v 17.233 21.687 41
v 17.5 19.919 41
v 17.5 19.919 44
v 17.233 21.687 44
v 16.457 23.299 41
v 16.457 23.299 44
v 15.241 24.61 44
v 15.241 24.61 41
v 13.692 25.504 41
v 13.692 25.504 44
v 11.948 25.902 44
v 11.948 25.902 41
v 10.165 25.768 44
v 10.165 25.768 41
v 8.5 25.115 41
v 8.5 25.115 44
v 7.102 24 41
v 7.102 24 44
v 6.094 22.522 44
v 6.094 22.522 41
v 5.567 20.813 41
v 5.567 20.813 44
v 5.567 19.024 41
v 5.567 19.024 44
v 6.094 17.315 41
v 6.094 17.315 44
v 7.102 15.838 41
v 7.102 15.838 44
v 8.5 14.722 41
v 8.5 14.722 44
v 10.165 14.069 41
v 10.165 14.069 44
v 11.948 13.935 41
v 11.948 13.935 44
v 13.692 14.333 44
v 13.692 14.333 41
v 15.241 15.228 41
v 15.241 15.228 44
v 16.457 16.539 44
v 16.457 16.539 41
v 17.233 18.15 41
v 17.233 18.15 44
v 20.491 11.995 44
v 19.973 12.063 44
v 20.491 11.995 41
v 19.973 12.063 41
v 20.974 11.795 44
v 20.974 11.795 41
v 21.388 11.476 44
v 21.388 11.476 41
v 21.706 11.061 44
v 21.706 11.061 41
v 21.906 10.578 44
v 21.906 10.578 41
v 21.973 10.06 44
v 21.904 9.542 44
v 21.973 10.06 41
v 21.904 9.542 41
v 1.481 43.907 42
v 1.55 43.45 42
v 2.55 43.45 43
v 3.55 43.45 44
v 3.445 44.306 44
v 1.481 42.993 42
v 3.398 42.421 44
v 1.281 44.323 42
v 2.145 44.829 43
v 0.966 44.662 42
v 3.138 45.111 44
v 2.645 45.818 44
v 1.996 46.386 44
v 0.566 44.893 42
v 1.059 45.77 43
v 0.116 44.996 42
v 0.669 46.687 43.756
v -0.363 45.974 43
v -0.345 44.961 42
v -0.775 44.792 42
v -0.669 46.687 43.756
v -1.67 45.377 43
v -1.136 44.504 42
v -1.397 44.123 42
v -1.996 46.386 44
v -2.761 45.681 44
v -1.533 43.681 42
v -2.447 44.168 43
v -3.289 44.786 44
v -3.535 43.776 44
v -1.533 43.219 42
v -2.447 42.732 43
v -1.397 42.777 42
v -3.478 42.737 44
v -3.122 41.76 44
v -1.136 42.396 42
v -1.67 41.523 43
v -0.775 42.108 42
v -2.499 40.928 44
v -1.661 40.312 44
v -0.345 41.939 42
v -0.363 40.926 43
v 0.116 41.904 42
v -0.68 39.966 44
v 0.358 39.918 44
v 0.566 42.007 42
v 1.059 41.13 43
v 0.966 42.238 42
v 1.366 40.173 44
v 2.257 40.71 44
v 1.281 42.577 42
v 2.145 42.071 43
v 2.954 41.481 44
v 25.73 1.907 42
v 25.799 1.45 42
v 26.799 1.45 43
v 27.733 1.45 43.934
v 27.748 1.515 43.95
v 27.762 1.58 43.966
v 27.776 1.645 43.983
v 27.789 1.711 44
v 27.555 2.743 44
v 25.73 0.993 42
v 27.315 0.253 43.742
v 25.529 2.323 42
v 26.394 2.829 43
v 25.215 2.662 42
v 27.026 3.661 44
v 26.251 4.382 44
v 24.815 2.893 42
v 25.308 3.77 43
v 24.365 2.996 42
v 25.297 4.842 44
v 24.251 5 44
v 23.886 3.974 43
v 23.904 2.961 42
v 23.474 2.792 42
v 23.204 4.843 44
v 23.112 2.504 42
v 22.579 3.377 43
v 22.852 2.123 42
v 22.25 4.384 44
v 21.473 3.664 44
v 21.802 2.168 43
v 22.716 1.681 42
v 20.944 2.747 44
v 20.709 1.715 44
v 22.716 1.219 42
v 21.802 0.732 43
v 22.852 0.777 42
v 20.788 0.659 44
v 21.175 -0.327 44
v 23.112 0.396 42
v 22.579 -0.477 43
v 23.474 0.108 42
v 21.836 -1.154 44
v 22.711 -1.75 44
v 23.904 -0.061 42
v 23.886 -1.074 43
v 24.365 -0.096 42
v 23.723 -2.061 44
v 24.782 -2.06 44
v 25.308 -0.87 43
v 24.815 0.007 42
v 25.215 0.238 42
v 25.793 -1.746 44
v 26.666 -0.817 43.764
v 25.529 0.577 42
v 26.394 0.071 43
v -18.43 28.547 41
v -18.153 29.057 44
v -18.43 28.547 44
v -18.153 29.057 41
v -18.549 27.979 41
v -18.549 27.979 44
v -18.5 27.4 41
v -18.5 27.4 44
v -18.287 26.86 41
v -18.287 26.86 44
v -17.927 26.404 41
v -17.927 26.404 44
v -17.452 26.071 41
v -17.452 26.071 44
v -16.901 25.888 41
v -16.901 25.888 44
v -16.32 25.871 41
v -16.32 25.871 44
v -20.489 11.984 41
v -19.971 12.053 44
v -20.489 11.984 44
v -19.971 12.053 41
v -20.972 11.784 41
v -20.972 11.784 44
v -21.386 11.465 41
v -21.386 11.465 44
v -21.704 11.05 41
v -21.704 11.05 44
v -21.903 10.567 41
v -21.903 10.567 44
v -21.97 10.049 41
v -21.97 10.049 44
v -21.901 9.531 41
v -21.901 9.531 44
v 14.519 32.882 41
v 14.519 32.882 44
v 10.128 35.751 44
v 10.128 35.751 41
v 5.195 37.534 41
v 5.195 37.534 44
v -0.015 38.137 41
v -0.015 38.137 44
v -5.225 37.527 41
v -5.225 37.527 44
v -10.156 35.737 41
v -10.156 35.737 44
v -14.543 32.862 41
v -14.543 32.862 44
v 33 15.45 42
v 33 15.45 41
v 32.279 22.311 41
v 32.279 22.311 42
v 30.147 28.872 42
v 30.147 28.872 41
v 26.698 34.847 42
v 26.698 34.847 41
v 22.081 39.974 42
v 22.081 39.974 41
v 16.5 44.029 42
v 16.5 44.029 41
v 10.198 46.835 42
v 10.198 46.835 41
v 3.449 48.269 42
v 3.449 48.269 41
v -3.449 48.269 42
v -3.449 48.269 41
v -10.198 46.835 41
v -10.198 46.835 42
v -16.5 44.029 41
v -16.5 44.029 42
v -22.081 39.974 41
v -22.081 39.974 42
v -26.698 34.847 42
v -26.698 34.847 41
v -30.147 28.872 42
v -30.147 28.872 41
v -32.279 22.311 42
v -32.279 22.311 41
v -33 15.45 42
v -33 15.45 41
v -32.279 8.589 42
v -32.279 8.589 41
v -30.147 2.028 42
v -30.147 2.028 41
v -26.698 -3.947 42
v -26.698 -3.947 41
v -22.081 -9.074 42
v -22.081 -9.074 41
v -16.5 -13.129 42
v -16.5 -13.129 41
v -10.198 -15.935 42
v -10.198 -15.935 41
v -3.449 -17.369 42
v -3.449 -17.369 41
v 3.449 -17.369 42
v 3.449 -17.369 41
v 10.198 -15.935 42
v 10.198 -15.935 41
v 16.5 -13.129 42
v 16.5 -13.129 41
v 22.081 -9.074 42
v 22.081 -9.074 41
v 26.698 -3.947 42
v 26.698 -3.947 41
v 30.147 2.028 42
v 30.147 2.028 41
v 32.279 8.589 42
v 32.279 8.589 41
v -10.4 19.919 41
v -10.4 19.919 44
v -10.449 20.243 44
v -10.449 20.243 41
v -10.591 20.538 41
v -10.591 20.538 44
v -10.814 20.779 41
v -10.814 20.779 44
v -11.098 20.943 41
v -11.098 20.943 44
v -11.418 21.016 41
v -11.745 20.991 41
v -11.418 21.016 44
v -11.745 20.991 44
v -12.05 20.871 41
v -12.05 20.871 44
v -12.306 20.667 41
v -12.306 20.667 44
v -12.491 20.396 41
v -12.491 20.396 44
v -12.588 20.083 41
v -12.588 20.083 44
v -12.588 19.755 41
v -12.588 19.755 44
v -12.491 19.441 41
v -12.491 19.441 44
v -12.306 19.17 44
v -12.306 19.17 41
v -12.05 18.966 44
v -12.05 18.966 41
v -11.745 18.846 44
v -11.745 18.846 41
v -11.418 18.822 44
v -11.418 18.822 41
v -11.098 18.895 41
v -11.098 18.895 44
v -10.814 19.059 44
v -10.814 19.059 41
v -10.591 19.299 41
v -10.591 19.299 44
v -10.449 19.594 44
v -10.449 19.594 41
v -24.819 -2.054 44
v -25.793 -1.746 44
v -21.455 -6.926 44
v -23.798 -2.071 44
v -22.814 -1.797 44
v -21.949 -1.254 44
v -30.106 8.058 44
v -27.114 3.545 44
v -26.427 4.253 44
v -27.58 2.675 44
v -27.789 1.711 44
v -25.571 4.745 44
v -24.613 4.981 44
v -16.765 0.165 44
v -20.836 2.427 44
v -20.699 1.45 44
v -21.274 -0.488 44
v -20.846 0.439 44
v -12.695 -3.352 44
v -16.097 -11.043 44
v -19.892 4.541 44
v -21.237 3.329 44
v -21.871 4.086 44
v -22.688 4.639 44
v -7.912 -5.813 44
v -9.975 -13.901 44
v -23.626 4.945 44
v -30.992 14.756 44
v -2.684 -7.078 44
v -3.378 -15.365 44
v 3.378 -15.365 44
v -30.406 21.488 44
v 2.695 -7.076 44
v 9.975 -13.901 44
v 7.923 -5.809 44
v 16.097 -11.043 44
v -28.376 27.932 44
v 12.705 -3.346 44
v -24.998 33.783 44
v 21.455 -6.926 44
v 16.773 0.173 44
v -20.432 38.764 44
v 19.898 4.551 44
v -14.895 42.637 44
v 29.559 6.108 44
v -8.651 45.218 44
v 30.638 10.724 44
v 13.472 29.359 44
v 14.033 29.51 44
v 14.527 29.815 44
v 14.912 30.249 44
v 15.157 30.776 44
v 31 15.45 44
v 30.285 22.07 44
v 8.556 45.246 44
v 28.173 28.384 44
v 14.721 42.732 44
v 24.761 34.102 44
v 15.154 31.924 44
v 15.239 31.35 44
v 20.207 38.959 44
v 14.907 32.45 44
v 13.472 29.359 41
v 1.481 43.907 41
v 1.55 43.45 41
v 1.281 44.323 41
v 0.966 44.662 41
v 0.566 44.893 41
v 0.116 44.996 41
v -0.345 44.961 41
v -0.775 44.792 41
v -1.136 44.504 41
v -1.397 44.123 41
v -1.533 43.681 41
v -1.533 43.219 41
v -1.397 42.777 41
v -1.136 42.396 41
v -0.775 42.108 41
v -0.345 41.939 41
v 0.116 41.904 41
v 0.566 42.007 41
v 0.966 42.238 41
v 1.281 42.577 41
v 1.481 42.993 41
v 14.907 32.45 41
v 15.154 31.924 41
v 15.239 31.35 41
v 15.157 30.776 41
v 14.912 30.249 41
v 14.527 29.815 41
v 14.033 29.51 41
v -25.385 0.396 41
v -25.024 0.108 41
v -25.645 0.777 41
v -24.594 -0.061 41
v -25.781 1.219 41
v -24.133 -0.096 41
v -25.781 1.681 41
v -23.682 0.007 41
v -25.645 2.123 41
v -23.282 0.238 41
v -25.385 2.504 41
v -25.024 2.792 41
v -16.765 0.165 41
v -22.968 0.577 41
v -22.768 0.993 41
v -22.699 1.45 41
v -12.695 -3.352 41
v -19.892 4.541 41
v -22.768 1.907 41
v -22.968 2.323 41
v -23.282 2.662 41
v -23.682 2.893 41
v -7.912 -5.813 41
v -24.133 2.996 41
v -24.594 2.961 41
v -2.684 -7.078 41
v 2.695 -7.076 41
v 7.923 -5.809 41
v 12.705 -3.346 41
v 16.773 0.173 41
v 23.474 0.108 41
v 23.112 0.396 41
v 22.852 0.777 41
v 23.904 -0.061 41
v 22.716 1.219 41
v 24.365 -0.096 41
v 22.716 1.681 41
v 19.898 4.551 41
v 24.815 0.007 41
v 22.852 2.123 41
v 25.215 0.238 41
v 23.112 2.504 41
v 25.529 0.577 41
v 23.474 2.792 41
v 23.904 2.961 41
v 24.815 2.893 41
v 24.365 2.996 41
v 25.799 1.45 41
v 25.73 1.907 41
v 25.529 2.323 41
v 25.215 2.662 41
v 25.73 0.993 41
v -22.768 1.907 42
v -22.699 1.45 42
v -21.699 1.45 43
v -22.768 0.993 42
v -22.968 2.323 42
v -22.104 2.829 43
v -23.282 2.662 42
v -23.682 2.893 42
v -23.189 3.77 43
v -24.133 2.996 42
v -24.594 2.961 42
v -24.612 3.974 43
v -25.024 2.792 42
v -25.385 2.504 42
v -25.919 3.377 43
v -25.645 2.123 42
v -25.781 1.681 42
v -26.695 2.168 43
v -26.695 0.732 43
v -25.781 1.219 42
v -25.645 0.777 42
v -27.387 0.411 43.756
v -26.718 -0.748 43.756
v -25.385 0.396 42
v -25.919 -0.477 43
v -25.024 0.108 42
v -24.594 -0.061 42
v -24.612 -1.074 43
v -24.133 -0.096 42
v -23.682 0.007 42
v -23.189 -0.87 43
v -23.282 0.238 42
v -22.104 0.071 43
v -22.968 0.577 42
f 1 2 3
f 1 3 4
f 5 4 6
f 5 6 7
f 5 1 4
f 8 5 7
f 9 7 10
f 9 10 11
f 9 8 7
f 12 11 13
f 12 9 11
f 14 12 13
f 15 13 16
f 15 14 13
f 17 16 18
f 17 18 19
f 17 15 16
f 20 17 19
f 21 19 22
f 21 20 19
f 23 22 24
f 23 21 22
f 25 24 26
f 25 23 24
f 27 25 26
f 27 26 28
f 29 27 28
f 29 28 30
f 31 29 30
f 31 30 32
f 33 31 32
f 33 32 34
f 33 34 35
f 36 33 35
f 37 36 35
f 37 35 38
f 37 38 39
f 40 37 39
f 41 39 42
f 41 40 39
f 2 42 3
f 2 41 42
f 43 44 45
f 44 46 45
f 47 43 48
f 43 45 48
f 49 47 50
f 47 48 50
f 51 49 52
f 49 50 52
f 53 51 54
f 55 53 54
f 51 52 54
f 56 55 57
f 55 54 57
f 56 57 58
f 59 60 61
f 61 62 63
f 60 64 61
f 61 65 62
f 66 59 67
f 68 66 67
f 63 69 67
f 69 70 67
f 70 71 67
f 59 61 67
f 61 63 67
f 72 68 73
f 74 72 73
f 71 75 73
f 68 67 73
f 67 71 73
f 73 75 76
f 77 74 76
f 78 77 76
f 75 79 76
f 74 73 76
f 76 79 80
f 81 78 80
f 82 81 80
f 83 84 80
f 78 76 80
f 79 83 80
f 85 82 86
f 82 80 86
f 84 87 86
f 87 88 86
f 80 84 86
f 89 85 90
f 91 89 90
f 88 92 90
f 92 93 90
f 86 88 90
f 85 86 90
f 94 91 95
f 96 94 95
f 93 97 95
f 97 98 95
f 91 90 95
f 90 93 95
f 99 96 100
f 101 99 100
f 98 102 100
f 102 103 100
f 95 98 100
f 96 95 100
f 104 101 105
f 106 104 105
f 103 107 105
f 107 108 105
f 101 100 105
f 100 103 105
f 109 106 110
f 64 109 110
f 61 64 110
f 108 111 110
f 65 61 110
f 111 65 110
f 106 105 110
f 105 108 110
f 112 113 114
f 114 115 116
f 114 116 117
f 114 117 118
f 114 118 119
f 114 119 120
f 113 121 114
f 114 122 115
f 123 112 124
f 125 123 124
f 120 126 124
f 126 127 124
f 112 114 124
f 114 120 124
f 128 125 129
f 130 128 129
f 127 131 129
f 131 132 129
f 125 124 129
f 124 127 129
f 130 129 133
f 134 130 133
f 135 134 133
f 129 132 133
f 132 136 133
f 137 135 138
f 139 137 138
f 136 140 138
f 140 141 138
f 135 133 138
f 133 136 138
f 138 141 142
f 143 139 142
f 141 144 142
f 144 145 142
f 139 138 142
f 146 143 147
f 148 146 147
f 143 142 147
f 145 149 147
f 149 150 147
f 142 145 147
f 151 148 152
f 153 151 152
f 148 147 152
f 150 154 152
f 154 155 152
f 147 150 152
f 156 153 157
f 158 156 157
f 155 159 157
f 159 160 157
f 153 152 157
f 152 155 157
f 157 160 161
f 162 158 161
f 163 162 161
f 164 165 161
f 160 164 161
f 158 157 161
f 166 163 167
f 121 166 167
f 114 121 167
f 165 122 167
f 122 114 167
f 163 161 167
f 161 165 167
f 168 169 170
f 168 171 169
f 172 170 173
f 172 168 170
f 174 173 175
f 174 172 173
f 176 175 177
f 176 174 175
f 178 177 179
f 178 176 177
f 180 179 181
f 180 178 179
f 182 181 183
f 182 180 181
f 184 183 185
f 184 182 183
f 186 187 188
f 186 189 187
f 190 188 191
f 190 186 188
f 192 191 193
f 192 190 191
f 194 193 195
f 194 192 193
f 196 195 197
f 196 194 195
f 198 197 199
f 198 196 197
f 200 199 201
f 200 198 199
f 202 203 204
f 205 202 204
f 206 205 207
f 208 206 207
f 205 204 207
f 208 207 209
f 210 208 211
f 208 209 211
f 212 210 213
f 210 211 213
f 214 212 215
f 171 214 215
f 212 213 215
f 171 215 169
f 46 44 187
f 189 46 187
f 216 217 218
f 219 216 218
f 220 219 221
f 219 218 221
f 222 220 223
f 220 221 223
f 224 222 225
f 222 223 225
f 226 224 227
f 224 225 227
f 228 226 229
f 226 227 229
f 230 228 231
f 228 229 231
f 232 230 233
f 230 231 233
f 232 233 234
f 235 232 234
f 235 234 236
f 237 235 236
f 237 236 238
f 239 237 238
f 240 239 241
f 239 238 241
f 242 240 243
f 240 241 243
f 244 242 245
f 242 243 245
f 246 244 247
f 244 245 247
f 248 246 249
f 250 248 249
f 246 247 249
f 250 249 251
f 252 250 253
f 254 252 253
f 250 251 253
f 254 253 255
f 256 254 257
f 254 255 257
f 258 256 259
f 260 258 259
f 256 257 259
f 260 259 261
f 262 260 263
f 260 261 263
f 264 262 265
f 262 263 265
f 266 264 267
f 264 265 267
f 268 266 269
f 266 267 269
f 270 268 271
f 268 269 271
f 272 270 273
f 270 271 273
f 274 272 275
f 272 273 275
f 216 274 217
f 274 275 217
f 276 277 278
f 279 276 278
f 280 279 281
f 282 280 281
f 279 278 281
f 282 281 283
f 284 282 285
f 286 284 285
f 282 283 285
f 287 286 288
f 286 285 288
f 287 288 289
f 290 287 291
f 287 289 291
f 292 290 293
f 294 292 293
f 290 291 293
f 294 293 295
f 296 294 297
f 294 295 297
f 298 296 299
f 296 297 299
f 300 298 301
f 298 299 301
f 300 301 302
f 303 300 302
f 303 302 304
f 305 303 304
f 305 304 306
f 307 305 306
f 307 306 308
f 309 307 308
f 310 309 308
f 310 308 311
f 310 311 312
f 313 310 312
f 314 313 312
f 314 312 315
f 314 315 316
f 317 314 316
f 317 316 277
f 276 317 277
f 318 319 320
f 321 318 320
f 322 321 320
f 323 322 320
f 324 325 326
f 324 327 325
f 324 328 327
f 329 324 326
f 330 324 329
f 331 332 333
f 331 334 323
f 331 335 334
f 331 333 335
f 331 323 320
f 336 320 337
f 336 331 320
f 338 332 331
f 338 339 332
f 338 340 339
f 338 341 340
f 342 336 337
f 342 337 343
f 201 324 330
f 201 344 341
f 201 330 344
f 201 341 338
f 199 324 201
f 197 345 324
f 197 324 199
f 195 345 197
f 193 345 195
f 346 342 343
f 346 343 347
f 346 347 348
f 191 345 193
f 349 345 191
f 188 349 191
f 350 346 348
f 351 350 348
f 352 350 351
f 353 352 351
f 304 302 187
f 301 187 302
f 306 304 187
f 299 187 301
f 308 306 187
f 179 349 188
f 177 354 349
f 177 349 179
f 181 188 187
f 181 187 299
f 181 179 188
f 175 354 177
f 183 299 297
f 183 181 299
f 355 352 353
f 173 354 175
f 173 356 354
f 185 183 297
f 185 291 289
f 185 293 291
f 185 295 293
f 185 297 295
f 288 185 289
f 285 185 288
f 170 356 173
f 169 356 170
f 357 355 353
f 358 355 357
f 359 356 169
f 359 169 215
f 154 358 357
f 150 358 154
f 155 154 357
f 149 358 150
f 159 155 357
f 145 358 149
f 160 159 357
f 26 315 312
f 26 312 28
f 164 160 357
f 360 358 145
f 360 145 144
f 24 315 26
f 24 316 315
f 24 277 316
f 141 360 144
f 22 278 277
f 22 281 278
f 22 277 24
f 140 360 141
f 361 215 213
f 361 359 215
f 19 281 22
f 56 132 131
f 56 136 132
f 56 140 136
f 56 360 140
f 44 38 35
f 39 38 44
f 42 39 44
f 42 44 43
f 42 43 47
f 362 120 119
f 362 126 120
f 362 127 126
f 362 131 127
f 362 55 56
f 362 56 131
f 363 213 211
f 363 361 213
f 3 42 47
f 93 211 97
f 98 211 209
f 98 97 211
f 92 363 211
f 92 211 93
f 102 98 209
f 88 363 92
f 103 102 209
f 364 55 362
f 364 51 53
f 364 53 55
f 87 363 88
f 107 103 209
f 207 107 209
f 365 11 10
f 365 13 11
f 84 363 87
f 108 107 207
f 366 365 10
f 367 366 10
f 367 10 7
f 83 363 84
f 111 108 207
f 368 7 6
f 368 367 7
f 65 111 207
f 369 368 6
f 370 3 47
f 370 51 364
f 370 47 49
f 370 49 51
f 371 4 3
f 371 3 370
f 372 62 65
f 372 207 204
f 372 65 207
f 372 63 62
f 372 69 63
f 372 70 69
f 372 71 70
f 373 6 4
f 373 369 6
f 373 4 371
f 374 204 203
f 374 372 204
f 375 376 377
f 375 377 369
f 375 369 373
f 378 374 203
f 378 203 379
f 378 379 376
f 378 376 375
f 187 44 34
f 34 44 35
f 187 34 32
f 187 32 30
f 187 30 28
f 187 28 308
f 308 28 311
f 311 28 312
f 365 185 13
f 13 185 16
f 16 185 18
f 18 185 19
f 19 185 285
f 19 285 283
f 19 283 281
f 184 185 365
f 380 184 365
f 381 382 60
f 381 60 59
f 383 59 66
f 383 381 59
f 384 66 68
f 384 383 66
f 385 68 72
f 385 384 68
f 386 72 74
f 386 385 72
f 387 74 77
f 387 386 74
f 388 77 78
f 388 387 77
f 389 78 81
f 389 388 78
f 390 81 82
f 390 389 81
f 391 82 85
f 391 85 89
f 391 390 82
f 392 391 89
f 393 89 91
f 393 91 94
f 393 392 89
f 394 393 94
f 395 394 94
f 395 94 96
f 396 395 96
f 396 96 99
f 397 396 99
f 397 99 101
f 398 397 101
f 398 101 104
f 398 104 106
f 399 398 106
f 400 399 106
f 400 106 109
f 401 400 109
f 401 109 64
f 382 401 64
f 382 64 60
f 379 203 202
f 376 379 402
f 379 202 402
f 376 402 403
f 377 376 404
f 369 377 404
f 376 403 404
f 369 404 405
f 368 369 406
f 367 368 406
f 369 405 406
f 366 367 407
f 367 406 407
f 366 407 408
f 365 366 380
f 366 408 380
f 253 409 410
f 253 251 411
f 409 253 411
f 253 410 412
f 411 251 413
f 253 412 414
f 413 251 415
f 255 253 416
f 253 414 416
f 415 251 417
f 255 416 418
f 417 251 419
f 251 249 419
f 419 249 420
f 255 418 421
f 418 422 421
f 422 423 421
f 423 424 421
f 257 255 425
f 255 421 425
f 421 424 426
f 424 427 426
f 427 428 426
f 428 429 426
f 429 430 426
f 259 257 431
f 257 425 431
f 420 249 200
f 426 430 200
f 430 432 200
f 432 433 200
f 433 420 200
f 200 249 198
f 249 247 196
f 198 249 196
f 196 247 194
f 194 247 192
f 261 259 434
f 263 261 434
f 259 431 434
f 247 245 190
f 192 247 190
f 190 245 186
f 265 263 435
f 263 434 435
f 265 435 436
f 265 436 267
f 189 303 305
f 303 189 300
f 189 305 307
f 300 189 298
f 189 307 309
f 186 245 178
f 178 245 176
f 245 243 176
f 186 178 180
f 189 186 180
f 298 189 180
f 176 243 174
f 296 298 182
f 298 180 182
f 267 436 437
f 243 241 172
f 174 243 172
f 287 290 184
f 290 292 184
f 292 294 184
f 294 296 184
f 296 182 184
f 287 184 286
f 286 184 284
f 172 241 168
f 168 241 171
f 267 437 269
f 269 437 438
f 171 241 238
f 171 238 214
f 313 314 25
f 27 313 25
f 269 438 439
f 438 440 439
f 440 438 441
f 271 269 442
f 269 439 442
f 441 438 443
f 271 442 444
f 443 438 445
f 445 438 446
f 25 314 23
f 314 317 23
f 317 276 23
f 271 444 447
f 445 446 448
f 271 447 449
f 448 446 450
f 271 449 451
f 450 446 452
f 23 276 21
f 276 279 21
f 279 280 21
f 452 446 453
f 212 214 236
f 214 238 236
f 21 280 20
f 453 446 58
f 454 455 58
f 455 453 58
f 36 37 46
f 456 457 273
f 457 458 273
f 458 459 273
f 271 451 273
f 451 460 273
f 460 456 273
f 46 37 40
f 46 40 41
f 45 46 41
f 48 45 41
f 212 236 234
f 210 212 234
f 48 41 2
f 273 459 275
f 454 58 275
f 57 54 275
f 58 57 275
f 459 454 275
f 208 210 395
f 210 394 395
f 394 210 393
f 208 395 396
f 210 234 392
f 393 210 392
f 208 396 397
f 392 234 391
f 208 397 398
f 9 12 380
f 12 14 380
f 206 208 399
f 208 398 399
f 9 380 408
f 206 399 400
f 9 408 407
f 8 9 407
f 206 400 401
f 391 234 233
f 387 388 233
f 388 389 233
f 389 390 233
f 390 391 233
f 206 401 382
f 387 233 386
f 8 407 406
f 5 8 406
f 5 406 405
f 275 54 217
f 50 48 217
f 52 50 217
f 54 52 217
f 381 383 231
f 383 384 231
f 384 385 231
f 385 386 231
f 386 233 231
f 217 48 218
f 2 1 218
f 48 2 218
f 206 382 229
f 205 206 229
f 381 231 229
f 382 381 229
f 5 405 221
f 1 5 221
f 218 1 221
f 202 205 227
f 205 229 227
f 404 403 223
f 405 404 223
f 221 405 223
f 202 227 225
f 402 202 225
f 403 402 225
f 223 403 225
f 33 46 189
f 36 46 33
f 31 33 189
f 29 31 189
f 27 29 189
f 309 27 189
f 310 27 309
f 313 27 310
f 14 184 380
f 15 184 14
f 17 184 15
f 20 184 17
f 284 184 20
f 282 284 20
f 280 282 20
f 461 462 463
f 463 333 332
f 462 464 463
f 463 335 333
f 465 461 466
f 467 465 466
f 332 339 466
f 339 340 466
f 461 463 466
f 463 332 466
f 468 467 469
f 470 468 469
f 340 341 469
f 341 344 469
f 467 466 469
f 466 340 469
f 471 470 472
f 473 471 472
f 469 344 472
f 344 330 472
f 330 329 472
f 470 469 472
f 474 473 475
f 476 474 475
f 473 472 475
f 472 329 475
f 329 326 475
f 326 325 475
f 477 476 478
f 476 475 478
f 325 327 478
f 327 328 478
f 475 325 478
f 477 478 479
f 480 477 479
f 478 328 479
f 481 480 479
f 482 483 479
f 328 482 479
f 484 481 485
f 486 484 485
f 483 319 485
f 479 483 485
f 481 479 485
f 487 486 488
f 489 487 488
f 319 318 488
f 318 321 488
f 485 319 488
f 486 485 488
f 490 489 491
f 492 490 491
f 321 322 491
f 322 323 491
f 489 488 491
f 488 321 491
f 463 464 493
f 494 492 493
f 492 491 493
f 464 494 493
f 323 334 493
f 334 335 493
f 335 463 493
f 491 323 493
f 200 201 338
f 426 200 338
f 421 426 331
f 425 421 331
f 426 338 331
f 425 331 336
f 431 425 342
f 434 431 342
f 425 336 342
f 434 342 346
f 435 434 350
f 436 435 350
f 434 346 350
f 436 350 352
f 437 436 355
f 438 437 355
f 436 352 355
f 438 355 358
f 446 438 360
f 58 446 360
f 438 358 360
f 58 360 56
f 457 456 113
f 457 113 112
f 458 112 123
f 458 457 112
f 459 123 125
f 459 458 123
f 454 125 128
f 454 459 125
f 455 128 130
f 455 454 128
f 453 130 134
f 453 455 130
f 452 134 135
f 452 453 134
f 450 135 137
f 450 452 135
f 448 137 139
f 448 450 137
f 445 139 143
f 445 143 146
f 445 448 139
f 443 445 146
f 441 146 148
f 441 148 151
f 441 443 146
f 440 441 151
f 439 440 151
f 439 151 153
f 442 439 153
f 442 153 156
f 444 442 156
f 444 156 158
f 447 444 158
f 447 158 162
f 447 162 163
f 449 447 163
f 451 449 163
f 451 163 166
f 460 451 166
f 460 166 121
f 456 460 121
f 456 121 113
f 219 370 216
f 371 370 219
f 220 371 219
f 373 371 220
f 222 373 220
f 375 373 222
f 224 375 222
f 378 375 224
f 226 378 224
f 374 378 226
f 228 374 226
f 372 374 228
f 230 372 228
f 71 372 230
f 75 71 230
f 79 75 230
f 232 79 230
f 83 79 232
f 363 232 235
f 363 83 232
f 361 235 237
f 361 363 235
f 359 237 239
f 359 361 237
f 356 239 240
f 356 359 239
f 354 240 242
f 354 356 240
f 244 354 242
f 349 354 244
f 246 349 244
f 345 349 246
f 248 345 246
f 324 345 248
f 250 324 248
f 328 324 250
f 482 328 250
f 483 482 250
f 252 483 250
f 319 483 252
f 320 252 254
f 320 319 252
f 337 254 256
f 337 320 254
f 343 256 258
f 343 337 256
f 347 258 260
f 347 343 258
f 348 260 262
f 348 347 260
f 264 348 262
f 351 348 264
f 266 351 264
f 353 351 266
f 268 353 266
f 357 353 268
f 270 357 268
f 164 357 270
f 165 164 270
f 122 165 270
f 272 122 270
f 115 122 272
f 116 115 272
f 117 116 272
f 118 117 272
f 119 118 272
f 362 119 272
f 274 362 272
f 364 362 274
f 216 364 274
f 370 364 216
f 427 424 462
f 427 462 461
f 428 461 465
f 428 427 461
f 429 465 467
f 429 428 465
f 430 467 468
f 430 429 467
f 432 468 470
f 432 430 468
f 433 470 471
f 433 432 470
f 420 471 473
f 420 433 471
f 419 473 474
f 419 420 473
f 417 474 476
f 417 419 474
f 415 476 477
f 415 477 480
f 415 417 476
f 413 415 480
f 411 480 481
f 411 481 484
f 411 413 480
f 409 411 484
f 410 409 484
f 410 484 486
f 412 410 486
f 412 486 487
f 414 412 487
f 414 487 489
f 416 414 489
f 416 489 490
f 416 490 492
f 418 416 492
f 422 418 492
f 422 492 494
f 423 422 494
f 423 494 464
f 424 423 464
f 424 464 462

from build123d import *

# Parameters (mm, degrees)
SKETCH1_R                = 15.45
SKETCH1_R_2              = 12.45
SKETCH1_R_3              = 33
SKETCH1_R_4              = 30
SKETCH1_R_5              = 4.05
SKETCH1_R_6              = 1.05
BOSS_EXTRUDE2_DEPTH      = 12.4
BOSS_EXTRUDE3_START      = 3
SKETCH2_R                = 33
BOSS_EXTRUDE3_DEPTH      = 3
SKETCH3_R                = 33
SKETCH3_R_2              = 30
BOSS_EXTRUDE4_DEPTH      = 28.6
FILLET1_R                = 10
BOSS_EXTRUDE5_DEPTH      = 12.4
CHAMFER1_SIZE            = 4
FILLET2_R                = 5
BOSS_EXTRUDE6_DEPTH      = 28.6
BOSS_EXTRUDE6_DEPTH_BACK = 14.4
SKETCH5_R                = 4.55
SKETCH5_R_2              = 1.55
FILLET3_R                = 5
CHAMFER2_SIZE            = 2
SKETCH6_W                = 4
SKETCH6_H                = 2
CUT_EXTRUDE1_DEPTH       = 23.4
SKETCH7_R                = 33
SKETCH7_R_2              = 1.55
SKETCH7_R_3              = 6
BOSS_EXTRUDE7_DEPTH      = 3
CUT_EXTRUDE3_START       = -3
SKETCH8_R                = 60.265040847
CUT_EXTRUDE3_DEPTH       = 127
CHAMFER3_SIZE            = 2
CUT_EXTRUDE4_DEPTH       = 10
FILLET4_R                = 2
SKETCH10_R               = 1.1
CUT_EXTRUDE5_DEPTH       = 10
CHAMFER4_SIZE            = 2


with BuildPart() as part:
    # Sketch1 → Boss-Extrude2 (new body)
    # profile 1 of 4: a face of its own
    with BuildSketch(Plane.XY):
        Circle(SKETCH1_R)
        with Locations(Location((0, 0, 0), (0, 0, 180))):
            Circle(SKETCH1_R_2, mode=Mode.SUBTRACT)
    # profile 2 of 4: a face of its own
    with BuildSketch(Plane.XY):
        with Locations(Location((0, 15.45, 0), (0, 0, 180))):
            Circle(SKETCH1_R_3)
        with Locations((0, 15.45)):
            Circle(SKETCH1_R_4, mode=Mode.SUBTRACT)
    # profile 3 of 4: a face of its own
    with BuildSketch(Plane.XY):
        with Locations(Location((11.5, 19.918584287, 0), (0, 0, 180))):
            Circle(SKETCH1_R_5)
        with Locations(Location((11.5, 19.918584287, 0), (0, 0, 180))):
            Circle(SKETCH1_R_6, mode=Mode.SUBTRACT)
    # profile 4 of 4: a face of its own
    with BuildSketch(Plane.XY):
        with Locations(Location((-11.5, 19.918584287, 0), (0, 0, 180))):
            Circle(SKETCH1_R_5)
        with Locations(Location((-11.5, 19.918584287, 0), (0, 0, 180))):
            Circle(SKETCH1_R_6, mode=Mode.SUBTRACT)
    extrude(amount=BOSS_EXTRUDE2_DEPTH)

    # Sketch2 → Boss-Extrude3 (add)
    with BuildSketch(Plane(origin=(0, 0, 0), x_dir=(-1, 0, 0), z_dir=(0, 0, -1)).offset(BOSS_EXTRUDE3_START)):
        with Locations(Location((0, 15.45, 0), (0, 0, 180))):
            Circle(SKETCH2_R)
    extrude(amount=-BOSS_EXTRUDE3_DEPTH)

    # Sketch3 → Boss-Extrude4 (add)
    with BuildSketch(Plane.XY.offset(12.4)):
        with Locations((0, 15.45)):
            Circle(SKETCH3_R)
        with Locations(Location((0, 15.45, 0), (0, 0, 256.137567884))):
            Circle(SKETCH3_R_2, mode=Mode.SUBTRACT)
    extrude(amount=BOSS_EXTRUDE4_DEPTH)

    # Fillet1
    # the kernel refuses this fillet: 10 mm, written as the material it adds along each edge
    with BuildSketch(Plane(origin=(-7.18774525, -13.676213592, 12.4), x_dir=(-0.20848530714015037, 0.9780254990063793, 0), z_dir=(0, 0, -1))) as fillet1_piece_1:
        with BuildLine():
            CenterArc((31.441766058, -6.395526036), FILLET1_R, 140.241533635, 142.62650255)
            ThreePointArc((33.668828933, -16.144381915), (14.016585538, -13.948724396), (0, 0))
            ThreePointArc((0, 0), (11.877146347, -5.568912274), (23.754292694, 0))
        make_face()
    extrude(amount=12.4)
    with BuildSketch(Plane(origin=(7.18774525, -13.676213592, 12.4), x_dir=(0.20848530714015037, 0.9780254990063793, 0), z_dir=(0, 0, -1))) as fillet1_piece_2:
        with BuildLine():
            CenterArc((31.441766058, 6.395526036), FILLET1_R, 77.131963815, 142.62650255)
            ThreePointArc((33.668828933, 16.144381915), (14.016585538, 13.948724396), (0, 0))
            ThreePointArc((0, 0), (11.877146347, 5.568912274), (23.754292694, 0))
        make_face()
    extrude(amount=12.4)

    # Sketch4 → Boss-Extrude5 (add)
    with BuildSketch(Plane.XY):
        Polygon((-15.355968184, 18.680032971), (-12.140166258, 9.556090373), (-4.457434094, 12.838952207), (4.080215127, 12.838952207), (12.140166258, 9.556090373), (15.355968184, 18.680032971), (9.70403689, 17.830268754), (8.160430255, 22.209822799), (0, 15.45), (-8.160430255, 22.209822799), (-10.090971595, 17.830268754), align=None)
    extrude(amount=BOSS_EXTRUDE5_DEPTH)

    # Chamfer1
    chamfer1_edges = [part.edges().sort_by_distance(p)[0] for p in [
        (0, 45.45, 0),
        (-23.339432443, 6.316081984, 0),
        (23.339432443, 6.316081984, 0),
    ]]
    chamfer(chamfer1_edges, length=CHAMFER1_SIZE)

    # Fillet2
    # the kernel refuses this fillet: 5 mm, written as the material it adds along each edge
    with BuildSketch(Plane(origin=(-11.5, 19.918584287, 0), x_dir=(0.4626548968458433, -0.8865384630260337, 0), z_dir=(0.8865384630260337, 0.4626548968458433, 0))) as fillet2_piece_1:
        with BuildLine():
            CenterArc((4.05 + FILLET2_R, -FILLET2_R), FILLET2_R, 90, 90)
            Line((4.05, -FILLET2_R), (4.05, 0))
            Line((4.05, 0), (4.05 + FILLET2_R, 0))
        make_face()
    revolve(axis=Axis((-11.5, 19.918584287, 0), (0, 0, -1)), revolution_arc=359.64)
    with BuildSketch(Plane(origin=(11.5, 19.918584287, 0), x_dir=(-0.4682160132284685, -0.8836140361925214, 0), z_dir=(0.8836140361925214, -0.4682160132284685, 0))) as fillet2_piece_2:
        with BuildLine():
            CenterArc((4.05 + FILLET2_R, -FILLET2_R), FILLET2_R, 90, 90)
            Line((4.05, -FILLET2_R), (4.05, 0))
            Line((4.05, 0), (4.05 + FILLET2_R, 0))
        make_face()
    revolve(axis=Axis((11.5, 19.918584287, 0), (0, 0, -1)), revolution_arc=359.64)

    # Sketch5 → Boss-Extrude6 (add, two sides: drawn at the far end of the back side and taken through both)
    # profile 1 of 3: a face of its own
    with BuildSketch(Plane.XY.offset(12.4).offset(-BOSS_EXTRUDE6_DEPTH_BACK)):
        with Locations((0, 43.45)):
            Circle(SKETCH5_R)
        with Locations((0, 43.45)):
            Circle(SKETCH5_R_2, mode=Mode.SUBTRACT)
    # profile 2 of 3: a face of its own
    with BuildSketch(Plane.XY.offset(12.4).offset(-BOSS_EXTRUDE6_DEPTH_BACK)):
        with Locations((24.248711306, 1.45)):
            Circle(SKETCH5_R)
        with Locations((24.248711306, 1.45)):
            Circle(SKETCH5_R_2, mode=Mode.SUBTRACT)
    # profile 3 of 3: a face of its own
    with BuildSketch(Plane.XY.offset(12.4).offset(-BOSS_EXTRUDE6_DEPTH_BACK)):
        with Locations((-24.248711306, 1.45)):
            Circle(SKETCH5_R)
        with Locations((-24.248711306, 1.45)):
            Circle(SKETCH5_R_2, mode=Mode.SUBTRACT)
    extrude(amount=BOSS_EXTRUDE6_DEPTH + BOSS_EXTRUDE6_DEPTH_BACK)

    # Fillet3
    fillet3_edges = [part.edges().sort_by_distance(p)[0] for p in [
        (23.612570286, -3.055310711, 26.7),
        (27.832354323, 4.25356964, 26.7),
        (-27.832354323, 4.25356964, 26.7),
        (-23.612570286, -3.055310711, 26.7),
        (4.219784038, 45.151741071, 22.5),
        (-4.219784038, 45.151741071, 22.5),
    ]]
    fillet(fillet3_edges, radius=FILLET3_R)

    # Chamfer2
    chamfer2_edges = [part.edges().sort_by_distance(p)[0] for p in [
        (-33, 15.45, -3),
    ]]
    chamfer(chamfer2_edges, length=CHAMFER2_SIZE)

    # Sketch6 → Cut-Extrude1 (cut)
    with BuildSketch(Plane.XY.offset(12.4)):
        with Locations((0, -13.034949107)):
            Rectangle(SKETCH6_W, SKETCH6_H)
    extrude(amount=-CUT_EXTRUDE1_DEPTH, mode=Mode.SUBTRACT)

    # Sketch7 → Boss-Extrude7 (add)
    with BuildSketch(Plane.XY.offset(41)):
        with Locations((0, 15.45)):
            Circle(SKETCH7_R)
        with Locations((-24.248711306, 1.45)):
            Circle(SKETCH7_R_2, mode=Mode.SUBTRACT)
        with Locations((24.248711306, 1.45)):
            Circle(SKETCH7_R_2, mode=Mode.SUBTRACT)
        with Locations((0, 43.45)):
            Circle(SKETCH7_R_2, mode=Mode.SUBTRACT)
        with Locations((11.5, 19.918584287)):
            Circle(SKETCH7_R_3, mode=Mode.SUBTRACT)
    extrude(amount=BOSS_EXTRUDE7_DEPTH)

    # Sketch8 → Cut-Extrude3 (cut)
    with BuildSketch(Plane.XY.offset(44).offset(CUT_EXTRUDE3_START)):
        with Locations((3.003651401, 17.042715902)):
            Circle(SKETCH8_R)
    extrude(amount=-CUT_EXTRUDE3_DEPTH, mode=Mode.SUBTRACT)

    # Chamfer3
    chamfer3_edges = [part.edges().sort_by_distance(p)[0] for p in [
        (-33, 15.45, 44),
    ]]
    chamfer(chamfer3_edges, length=CHAMFER3_SIZE)

    # Sketch9 → Cut-Extrude4 (cut)
    with BuildSketch(Plane.XY.offset(44)):
        with BuildLine():
            ThreePointArc((17.542861073, 29.835702421), (-2.638036688, 37.983112773), (-20.39130231, 25.394606522))
            Line((-20.39130231, 25.394606522), (17.542861073, 29.835702421))
        make_face()
        with BuildLine():
            Line((22.432842806, 12.063560512), (-22.43109496, 12.052002402))
            ThreePointArc((-22.43109496, 12.052002402), (0.00584476, -7.23700894), (22.432842806, 12.063560512))
        make_face()
    extrude(amount=-CUT_EXTRUDE4_DEPTH, mode=Mode.SUBTRACT)

    # Fillet4
    fillet4_edges = [part.edges().sort_by_distance(p)[0] for p in [
        (17.542861073, 29.835702421, 42.5),
        (-20.39130231, 25.394606522, 42.5),
        (-22.43109496, 12.052002402, 42.5),
        (22.432842806, 12.063560512, 42.5),
    ]]
    fillet(fillet4_edges, radius=FILLET4_R)

    # Sketch10 → Cut-Extrude5 (cut)
    with BuildSketch(Plane.XY.offset(44)):
        with Locations((-11.5, 19.918584287)):
            Circle(SKETCH10_R)
    extrude(amount=-CUT_EXTRUDE5_DEPTH, mode=Mode.SUBTRACT)

    # Chamfer4
    # the kernel refuses this chamfer: 2 mm, written as the material it takes off along each edge
    with BuildSketch(Plane(origin=(0, 43.45, 44), x_dir=(1, 0, 0), z_dir=(0, -1, 0))) as chamfer4_piece_1:
        Polygon((1.55, -CHAMFER4_SIZE), (1.55 + CHAMFER4_SIZE, 0), (1.55, 0), align=None)
    revolve(axis=Axis((0, 43.45, 44), (0, 0, 1)), mode=Mode.SUBTRACT)
    with BuildSketch(Plane(origin=(-24.248711306, 1.45, 44), x_dir=(1, 0, 0), z_dir=(0, -1, 0))) as chamfer4_piece_2:
        Polygon((1.55, -CHAMFER4_SIZE), (1.55 + CHAMFER4_SIZE, 0), (1.55, 0), align=None)
    revolve(axis=Axis((-24.248711306, 1.45, 44), (0, 0, 1)), mode=Mode.SUBTRACT)
    with BuildSketch(Plane(origin=(24.248711306, 1.45, 44), x_dir=(1, 0, 0), z_dir=(0, -1, 0))) as chamfer4_piece_3:
        Polygon((1.55, -CHAMFER4_SIZE), (1.55 + CHAMFER4_SIZE, 0), (1.55, 0), align=None)
    revolve(axis=Axis((24.248711306, 1.45, 44), (0, 0, 1)), mode=Mode.SUBTRACT)


solid = part.part
